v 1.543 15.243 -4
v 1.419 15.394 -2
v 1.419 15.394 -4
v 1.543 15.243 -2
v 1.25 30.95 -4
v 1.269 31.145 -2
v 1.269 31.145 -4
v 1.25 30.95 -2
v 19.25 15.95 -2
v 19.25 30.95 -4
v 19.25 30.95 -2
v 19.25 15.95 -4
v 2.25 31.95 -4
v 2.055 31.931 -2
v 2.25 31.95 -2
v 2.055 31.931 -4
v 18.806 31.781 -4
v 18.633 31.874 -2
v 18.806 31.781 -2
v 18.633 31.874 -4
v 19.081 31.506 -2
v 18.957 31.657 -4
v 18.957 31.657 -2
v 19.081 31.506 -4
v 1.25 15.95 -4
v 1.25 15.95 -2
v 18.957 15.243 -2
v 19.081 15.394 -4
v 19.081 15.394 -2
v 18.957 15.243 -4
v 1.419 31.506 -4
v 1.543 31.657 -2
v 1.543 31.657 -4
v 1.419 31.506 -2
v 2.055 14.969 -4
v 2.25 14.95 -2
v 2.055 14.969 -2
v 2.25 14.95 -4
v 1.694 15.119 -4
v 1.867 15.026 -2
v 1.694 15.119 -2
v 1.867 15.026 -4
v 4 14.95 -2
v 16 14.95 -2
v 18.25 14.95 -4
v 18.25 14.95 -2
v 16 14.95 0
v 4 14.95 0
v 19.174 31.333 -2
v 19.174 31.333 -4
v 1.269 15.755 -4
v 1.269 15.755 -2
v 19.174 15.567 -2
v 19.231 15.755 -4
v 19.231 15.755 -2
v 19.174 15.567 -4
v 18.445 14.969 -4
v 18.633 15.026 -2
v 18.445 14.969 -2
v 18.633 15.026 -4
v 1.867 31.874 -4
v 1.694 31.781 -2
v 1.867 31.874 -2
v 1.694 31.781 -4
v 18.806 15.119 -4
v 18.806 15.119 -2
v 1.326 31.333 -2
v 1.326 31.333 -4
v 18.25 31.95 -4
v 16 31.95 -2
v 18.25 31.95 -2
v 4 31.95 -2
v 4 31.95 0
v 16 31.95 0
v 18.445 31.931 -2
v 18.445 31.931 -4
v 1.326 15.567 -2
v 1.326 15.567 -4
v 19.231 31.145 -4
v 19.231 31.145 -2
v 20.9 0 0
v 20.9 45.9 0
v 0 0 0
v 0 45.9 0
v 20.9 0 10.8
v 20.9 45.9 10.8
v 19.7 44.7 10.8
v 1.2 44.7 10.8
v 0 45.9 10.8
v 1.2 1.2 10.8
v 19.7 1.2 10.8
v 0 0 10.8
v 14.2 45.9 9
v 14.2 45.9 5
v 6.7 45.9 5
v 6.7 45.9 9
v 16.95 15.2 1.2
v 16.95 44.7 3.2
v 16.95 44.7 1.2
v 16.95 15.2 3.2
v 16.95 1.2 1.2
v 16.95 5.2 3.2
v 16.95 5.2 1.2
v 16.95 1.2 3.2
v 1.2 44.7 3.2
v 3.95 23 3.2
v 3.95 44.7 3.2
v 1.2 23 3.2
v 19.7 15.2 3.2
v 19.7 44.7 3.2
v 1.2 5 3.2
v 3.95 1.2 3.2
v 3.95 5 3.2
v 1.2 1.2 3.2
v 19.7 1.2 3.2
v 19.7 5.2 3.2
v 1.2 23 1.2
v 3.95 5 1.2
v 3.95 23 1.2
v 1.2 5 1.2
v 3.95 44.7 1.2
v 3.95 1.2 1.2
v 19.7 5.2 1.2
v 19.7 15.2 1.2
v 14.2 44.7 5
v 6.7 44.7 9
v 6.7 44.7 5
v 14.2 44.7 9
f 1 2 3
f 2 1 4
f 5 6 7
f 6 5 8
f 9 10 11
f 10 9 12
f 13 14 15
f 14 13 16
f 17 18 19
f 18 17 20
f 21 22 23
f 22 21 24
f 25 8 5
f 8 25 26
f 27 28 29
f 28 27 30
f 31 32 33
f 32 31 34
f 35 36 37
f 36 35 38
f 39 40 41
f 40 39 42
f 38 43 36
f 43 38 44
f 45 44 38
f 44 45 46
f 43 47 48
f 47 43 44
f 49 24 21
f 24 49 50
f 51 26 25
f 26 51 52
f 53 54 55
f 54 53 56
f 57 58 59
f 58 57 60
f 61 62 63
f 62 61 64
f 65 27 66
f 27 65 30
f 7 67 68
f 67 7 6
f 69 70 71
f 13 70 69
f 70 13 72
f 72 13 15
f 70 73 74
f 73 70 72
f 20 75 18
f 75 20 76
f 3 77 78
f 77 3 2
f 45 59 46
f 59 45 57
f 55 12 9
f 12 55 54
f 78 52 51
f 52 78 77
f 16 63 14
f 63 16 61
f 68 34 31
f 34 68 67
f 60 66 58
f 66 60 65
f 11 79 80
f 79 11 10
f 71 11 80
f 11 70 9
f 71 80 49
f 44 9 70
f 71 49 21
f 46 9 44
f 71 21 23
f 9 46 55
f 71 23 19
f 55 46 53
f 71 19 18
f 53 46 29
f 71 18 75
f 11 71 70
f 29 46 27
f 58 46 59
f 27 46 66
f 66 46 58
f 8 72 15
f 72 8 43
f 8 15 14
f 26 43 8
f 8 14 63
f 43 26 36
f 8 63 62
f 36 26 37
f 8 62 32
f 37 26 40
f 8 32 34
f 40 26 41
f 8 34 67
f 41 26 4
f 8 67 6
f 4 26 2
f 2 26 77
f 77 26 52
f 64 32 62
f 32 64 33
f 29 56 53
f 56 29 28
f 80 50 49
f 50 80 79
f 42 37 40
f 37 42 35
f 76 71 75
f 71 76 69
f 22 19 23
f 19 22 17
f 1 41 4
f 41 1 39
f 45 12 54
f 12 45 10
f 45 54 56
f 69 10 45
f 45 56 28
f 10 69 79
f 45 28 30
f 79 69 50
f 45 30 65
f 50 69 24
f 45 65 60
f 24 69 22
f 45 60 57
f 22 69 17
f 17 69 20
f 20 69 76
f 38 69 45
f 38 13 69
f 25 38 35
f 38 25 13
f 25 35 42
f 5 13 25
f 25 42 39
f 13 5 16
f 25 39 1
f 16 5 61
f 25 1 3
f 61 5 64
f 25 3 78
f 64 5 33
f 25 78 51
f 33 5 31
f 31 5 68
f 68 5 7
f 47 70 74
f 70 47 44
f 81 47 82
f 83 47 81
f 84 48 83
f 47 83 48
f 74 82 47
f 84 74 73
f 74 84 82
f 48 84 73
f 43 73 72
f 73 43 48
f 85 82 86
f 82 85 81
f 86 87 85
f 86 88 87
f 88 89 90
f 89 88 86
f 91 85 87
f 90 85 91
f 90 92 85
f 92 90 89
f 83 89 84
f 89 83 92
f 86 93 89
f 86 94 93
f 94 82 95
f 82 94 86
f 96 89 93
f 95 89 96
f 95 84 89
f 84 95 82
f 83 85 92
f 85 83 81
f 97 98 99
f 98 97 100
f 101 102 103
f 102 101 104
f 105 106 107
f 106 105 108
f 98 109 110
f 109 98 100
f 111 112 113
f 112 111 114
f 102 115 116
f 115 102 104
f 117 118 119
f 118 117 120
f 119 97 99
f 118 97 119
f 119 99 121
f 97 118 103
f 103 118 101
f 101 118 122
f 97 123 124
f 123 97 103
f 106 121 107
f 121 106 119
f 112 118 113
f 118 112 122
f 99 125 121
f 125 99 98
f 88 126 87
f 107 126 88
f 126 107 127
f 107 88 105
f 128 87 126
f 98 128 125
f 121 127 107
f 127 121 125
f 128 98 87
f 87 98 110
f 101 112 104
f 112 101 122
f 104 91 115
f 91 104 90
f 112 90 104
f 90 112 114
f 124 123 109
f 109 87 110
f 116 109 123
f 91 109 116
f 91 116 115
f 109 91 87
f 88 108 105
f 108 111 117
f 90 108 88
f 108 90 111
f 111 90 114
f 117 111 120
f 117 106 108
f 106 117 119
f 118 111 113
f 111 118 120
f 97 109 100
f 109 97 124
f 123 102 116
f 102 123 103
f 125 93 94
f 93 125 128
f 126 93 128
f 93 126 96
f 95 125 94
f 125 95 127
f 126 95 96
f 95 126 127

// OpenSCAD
board_w = 18.5;
board_l = 43.5;
wall = 1.2;
h = 4.6+5;

camera_shoe();
base();

//lid();

module base() {

difference() {
    cube([2*wall+board_w,2*wall+board_l,wall+h]);
    
    
    translate([wall+(board_w-13)/2,wall,wall])
        cube([13,board_l,2]);
        
    translate([wall,wall,wall+2])
        cube([board_w,board_l,h]);
    
    //space of pinns
    translate([wall,5,wall]) cube([5,18,3]);  
    translate([wall+board_w-3,wall+4,wall]) cube([3,10,3]);
        
    //jack
    translate([wall+board_w/2-7.5/2,wall+board_l,wall+2+1.6+0.2])
        cube([7.5,wall,4]);
}

}


module lid() {

translate([wall,wall,wall+2+1.6])
difference() {
    translate([0,.5,0]) cube([board_w,board_l-1,h-wall-2-1.6]);
    translate([2.5,.5,0]) 
        cube([board_w-5,board_l,h-wall-2-1.6]);
    
    //space of pinns
    //cube([5,20,5]);
    translate([0,5-wall,0]) cube([5,18,h+5]);
    // button pins
    translate([board_w-2.5,4,0]) cube([2.5,10,h-wall-2-1.6]);
}

difference() {
    translate([0,0,h])
    cube([2*wall+board_w,2*wall+board_l,wall]);
    
    translate([0,5,0]) cube([5,18,h+5]);
    
    translate([wall+13,wall+8.5,wall])
        cylinder($fn=32, d=4.5,h=h);
        
}


} //lid


module camera_shoe() {
translate([0,wall+board_l/2-8,-4]) {
    //plate
    translate([1+board_w/2-8,1,0])
    hull() {
        cylinder($fn=32,h=2,d=2);
        translate([16,0,0]) cylinder($fn=32,h=2,d=2);
        translate([16,15,0]) cylinder($fn=32,h=2,d=2);
        translate([0,15,0]) cylinder($fn=32,h=2,d=2);
    }
    translate([4,0,2]) cube([12,17,2]);
    //cube([18,18,2]);
}}
